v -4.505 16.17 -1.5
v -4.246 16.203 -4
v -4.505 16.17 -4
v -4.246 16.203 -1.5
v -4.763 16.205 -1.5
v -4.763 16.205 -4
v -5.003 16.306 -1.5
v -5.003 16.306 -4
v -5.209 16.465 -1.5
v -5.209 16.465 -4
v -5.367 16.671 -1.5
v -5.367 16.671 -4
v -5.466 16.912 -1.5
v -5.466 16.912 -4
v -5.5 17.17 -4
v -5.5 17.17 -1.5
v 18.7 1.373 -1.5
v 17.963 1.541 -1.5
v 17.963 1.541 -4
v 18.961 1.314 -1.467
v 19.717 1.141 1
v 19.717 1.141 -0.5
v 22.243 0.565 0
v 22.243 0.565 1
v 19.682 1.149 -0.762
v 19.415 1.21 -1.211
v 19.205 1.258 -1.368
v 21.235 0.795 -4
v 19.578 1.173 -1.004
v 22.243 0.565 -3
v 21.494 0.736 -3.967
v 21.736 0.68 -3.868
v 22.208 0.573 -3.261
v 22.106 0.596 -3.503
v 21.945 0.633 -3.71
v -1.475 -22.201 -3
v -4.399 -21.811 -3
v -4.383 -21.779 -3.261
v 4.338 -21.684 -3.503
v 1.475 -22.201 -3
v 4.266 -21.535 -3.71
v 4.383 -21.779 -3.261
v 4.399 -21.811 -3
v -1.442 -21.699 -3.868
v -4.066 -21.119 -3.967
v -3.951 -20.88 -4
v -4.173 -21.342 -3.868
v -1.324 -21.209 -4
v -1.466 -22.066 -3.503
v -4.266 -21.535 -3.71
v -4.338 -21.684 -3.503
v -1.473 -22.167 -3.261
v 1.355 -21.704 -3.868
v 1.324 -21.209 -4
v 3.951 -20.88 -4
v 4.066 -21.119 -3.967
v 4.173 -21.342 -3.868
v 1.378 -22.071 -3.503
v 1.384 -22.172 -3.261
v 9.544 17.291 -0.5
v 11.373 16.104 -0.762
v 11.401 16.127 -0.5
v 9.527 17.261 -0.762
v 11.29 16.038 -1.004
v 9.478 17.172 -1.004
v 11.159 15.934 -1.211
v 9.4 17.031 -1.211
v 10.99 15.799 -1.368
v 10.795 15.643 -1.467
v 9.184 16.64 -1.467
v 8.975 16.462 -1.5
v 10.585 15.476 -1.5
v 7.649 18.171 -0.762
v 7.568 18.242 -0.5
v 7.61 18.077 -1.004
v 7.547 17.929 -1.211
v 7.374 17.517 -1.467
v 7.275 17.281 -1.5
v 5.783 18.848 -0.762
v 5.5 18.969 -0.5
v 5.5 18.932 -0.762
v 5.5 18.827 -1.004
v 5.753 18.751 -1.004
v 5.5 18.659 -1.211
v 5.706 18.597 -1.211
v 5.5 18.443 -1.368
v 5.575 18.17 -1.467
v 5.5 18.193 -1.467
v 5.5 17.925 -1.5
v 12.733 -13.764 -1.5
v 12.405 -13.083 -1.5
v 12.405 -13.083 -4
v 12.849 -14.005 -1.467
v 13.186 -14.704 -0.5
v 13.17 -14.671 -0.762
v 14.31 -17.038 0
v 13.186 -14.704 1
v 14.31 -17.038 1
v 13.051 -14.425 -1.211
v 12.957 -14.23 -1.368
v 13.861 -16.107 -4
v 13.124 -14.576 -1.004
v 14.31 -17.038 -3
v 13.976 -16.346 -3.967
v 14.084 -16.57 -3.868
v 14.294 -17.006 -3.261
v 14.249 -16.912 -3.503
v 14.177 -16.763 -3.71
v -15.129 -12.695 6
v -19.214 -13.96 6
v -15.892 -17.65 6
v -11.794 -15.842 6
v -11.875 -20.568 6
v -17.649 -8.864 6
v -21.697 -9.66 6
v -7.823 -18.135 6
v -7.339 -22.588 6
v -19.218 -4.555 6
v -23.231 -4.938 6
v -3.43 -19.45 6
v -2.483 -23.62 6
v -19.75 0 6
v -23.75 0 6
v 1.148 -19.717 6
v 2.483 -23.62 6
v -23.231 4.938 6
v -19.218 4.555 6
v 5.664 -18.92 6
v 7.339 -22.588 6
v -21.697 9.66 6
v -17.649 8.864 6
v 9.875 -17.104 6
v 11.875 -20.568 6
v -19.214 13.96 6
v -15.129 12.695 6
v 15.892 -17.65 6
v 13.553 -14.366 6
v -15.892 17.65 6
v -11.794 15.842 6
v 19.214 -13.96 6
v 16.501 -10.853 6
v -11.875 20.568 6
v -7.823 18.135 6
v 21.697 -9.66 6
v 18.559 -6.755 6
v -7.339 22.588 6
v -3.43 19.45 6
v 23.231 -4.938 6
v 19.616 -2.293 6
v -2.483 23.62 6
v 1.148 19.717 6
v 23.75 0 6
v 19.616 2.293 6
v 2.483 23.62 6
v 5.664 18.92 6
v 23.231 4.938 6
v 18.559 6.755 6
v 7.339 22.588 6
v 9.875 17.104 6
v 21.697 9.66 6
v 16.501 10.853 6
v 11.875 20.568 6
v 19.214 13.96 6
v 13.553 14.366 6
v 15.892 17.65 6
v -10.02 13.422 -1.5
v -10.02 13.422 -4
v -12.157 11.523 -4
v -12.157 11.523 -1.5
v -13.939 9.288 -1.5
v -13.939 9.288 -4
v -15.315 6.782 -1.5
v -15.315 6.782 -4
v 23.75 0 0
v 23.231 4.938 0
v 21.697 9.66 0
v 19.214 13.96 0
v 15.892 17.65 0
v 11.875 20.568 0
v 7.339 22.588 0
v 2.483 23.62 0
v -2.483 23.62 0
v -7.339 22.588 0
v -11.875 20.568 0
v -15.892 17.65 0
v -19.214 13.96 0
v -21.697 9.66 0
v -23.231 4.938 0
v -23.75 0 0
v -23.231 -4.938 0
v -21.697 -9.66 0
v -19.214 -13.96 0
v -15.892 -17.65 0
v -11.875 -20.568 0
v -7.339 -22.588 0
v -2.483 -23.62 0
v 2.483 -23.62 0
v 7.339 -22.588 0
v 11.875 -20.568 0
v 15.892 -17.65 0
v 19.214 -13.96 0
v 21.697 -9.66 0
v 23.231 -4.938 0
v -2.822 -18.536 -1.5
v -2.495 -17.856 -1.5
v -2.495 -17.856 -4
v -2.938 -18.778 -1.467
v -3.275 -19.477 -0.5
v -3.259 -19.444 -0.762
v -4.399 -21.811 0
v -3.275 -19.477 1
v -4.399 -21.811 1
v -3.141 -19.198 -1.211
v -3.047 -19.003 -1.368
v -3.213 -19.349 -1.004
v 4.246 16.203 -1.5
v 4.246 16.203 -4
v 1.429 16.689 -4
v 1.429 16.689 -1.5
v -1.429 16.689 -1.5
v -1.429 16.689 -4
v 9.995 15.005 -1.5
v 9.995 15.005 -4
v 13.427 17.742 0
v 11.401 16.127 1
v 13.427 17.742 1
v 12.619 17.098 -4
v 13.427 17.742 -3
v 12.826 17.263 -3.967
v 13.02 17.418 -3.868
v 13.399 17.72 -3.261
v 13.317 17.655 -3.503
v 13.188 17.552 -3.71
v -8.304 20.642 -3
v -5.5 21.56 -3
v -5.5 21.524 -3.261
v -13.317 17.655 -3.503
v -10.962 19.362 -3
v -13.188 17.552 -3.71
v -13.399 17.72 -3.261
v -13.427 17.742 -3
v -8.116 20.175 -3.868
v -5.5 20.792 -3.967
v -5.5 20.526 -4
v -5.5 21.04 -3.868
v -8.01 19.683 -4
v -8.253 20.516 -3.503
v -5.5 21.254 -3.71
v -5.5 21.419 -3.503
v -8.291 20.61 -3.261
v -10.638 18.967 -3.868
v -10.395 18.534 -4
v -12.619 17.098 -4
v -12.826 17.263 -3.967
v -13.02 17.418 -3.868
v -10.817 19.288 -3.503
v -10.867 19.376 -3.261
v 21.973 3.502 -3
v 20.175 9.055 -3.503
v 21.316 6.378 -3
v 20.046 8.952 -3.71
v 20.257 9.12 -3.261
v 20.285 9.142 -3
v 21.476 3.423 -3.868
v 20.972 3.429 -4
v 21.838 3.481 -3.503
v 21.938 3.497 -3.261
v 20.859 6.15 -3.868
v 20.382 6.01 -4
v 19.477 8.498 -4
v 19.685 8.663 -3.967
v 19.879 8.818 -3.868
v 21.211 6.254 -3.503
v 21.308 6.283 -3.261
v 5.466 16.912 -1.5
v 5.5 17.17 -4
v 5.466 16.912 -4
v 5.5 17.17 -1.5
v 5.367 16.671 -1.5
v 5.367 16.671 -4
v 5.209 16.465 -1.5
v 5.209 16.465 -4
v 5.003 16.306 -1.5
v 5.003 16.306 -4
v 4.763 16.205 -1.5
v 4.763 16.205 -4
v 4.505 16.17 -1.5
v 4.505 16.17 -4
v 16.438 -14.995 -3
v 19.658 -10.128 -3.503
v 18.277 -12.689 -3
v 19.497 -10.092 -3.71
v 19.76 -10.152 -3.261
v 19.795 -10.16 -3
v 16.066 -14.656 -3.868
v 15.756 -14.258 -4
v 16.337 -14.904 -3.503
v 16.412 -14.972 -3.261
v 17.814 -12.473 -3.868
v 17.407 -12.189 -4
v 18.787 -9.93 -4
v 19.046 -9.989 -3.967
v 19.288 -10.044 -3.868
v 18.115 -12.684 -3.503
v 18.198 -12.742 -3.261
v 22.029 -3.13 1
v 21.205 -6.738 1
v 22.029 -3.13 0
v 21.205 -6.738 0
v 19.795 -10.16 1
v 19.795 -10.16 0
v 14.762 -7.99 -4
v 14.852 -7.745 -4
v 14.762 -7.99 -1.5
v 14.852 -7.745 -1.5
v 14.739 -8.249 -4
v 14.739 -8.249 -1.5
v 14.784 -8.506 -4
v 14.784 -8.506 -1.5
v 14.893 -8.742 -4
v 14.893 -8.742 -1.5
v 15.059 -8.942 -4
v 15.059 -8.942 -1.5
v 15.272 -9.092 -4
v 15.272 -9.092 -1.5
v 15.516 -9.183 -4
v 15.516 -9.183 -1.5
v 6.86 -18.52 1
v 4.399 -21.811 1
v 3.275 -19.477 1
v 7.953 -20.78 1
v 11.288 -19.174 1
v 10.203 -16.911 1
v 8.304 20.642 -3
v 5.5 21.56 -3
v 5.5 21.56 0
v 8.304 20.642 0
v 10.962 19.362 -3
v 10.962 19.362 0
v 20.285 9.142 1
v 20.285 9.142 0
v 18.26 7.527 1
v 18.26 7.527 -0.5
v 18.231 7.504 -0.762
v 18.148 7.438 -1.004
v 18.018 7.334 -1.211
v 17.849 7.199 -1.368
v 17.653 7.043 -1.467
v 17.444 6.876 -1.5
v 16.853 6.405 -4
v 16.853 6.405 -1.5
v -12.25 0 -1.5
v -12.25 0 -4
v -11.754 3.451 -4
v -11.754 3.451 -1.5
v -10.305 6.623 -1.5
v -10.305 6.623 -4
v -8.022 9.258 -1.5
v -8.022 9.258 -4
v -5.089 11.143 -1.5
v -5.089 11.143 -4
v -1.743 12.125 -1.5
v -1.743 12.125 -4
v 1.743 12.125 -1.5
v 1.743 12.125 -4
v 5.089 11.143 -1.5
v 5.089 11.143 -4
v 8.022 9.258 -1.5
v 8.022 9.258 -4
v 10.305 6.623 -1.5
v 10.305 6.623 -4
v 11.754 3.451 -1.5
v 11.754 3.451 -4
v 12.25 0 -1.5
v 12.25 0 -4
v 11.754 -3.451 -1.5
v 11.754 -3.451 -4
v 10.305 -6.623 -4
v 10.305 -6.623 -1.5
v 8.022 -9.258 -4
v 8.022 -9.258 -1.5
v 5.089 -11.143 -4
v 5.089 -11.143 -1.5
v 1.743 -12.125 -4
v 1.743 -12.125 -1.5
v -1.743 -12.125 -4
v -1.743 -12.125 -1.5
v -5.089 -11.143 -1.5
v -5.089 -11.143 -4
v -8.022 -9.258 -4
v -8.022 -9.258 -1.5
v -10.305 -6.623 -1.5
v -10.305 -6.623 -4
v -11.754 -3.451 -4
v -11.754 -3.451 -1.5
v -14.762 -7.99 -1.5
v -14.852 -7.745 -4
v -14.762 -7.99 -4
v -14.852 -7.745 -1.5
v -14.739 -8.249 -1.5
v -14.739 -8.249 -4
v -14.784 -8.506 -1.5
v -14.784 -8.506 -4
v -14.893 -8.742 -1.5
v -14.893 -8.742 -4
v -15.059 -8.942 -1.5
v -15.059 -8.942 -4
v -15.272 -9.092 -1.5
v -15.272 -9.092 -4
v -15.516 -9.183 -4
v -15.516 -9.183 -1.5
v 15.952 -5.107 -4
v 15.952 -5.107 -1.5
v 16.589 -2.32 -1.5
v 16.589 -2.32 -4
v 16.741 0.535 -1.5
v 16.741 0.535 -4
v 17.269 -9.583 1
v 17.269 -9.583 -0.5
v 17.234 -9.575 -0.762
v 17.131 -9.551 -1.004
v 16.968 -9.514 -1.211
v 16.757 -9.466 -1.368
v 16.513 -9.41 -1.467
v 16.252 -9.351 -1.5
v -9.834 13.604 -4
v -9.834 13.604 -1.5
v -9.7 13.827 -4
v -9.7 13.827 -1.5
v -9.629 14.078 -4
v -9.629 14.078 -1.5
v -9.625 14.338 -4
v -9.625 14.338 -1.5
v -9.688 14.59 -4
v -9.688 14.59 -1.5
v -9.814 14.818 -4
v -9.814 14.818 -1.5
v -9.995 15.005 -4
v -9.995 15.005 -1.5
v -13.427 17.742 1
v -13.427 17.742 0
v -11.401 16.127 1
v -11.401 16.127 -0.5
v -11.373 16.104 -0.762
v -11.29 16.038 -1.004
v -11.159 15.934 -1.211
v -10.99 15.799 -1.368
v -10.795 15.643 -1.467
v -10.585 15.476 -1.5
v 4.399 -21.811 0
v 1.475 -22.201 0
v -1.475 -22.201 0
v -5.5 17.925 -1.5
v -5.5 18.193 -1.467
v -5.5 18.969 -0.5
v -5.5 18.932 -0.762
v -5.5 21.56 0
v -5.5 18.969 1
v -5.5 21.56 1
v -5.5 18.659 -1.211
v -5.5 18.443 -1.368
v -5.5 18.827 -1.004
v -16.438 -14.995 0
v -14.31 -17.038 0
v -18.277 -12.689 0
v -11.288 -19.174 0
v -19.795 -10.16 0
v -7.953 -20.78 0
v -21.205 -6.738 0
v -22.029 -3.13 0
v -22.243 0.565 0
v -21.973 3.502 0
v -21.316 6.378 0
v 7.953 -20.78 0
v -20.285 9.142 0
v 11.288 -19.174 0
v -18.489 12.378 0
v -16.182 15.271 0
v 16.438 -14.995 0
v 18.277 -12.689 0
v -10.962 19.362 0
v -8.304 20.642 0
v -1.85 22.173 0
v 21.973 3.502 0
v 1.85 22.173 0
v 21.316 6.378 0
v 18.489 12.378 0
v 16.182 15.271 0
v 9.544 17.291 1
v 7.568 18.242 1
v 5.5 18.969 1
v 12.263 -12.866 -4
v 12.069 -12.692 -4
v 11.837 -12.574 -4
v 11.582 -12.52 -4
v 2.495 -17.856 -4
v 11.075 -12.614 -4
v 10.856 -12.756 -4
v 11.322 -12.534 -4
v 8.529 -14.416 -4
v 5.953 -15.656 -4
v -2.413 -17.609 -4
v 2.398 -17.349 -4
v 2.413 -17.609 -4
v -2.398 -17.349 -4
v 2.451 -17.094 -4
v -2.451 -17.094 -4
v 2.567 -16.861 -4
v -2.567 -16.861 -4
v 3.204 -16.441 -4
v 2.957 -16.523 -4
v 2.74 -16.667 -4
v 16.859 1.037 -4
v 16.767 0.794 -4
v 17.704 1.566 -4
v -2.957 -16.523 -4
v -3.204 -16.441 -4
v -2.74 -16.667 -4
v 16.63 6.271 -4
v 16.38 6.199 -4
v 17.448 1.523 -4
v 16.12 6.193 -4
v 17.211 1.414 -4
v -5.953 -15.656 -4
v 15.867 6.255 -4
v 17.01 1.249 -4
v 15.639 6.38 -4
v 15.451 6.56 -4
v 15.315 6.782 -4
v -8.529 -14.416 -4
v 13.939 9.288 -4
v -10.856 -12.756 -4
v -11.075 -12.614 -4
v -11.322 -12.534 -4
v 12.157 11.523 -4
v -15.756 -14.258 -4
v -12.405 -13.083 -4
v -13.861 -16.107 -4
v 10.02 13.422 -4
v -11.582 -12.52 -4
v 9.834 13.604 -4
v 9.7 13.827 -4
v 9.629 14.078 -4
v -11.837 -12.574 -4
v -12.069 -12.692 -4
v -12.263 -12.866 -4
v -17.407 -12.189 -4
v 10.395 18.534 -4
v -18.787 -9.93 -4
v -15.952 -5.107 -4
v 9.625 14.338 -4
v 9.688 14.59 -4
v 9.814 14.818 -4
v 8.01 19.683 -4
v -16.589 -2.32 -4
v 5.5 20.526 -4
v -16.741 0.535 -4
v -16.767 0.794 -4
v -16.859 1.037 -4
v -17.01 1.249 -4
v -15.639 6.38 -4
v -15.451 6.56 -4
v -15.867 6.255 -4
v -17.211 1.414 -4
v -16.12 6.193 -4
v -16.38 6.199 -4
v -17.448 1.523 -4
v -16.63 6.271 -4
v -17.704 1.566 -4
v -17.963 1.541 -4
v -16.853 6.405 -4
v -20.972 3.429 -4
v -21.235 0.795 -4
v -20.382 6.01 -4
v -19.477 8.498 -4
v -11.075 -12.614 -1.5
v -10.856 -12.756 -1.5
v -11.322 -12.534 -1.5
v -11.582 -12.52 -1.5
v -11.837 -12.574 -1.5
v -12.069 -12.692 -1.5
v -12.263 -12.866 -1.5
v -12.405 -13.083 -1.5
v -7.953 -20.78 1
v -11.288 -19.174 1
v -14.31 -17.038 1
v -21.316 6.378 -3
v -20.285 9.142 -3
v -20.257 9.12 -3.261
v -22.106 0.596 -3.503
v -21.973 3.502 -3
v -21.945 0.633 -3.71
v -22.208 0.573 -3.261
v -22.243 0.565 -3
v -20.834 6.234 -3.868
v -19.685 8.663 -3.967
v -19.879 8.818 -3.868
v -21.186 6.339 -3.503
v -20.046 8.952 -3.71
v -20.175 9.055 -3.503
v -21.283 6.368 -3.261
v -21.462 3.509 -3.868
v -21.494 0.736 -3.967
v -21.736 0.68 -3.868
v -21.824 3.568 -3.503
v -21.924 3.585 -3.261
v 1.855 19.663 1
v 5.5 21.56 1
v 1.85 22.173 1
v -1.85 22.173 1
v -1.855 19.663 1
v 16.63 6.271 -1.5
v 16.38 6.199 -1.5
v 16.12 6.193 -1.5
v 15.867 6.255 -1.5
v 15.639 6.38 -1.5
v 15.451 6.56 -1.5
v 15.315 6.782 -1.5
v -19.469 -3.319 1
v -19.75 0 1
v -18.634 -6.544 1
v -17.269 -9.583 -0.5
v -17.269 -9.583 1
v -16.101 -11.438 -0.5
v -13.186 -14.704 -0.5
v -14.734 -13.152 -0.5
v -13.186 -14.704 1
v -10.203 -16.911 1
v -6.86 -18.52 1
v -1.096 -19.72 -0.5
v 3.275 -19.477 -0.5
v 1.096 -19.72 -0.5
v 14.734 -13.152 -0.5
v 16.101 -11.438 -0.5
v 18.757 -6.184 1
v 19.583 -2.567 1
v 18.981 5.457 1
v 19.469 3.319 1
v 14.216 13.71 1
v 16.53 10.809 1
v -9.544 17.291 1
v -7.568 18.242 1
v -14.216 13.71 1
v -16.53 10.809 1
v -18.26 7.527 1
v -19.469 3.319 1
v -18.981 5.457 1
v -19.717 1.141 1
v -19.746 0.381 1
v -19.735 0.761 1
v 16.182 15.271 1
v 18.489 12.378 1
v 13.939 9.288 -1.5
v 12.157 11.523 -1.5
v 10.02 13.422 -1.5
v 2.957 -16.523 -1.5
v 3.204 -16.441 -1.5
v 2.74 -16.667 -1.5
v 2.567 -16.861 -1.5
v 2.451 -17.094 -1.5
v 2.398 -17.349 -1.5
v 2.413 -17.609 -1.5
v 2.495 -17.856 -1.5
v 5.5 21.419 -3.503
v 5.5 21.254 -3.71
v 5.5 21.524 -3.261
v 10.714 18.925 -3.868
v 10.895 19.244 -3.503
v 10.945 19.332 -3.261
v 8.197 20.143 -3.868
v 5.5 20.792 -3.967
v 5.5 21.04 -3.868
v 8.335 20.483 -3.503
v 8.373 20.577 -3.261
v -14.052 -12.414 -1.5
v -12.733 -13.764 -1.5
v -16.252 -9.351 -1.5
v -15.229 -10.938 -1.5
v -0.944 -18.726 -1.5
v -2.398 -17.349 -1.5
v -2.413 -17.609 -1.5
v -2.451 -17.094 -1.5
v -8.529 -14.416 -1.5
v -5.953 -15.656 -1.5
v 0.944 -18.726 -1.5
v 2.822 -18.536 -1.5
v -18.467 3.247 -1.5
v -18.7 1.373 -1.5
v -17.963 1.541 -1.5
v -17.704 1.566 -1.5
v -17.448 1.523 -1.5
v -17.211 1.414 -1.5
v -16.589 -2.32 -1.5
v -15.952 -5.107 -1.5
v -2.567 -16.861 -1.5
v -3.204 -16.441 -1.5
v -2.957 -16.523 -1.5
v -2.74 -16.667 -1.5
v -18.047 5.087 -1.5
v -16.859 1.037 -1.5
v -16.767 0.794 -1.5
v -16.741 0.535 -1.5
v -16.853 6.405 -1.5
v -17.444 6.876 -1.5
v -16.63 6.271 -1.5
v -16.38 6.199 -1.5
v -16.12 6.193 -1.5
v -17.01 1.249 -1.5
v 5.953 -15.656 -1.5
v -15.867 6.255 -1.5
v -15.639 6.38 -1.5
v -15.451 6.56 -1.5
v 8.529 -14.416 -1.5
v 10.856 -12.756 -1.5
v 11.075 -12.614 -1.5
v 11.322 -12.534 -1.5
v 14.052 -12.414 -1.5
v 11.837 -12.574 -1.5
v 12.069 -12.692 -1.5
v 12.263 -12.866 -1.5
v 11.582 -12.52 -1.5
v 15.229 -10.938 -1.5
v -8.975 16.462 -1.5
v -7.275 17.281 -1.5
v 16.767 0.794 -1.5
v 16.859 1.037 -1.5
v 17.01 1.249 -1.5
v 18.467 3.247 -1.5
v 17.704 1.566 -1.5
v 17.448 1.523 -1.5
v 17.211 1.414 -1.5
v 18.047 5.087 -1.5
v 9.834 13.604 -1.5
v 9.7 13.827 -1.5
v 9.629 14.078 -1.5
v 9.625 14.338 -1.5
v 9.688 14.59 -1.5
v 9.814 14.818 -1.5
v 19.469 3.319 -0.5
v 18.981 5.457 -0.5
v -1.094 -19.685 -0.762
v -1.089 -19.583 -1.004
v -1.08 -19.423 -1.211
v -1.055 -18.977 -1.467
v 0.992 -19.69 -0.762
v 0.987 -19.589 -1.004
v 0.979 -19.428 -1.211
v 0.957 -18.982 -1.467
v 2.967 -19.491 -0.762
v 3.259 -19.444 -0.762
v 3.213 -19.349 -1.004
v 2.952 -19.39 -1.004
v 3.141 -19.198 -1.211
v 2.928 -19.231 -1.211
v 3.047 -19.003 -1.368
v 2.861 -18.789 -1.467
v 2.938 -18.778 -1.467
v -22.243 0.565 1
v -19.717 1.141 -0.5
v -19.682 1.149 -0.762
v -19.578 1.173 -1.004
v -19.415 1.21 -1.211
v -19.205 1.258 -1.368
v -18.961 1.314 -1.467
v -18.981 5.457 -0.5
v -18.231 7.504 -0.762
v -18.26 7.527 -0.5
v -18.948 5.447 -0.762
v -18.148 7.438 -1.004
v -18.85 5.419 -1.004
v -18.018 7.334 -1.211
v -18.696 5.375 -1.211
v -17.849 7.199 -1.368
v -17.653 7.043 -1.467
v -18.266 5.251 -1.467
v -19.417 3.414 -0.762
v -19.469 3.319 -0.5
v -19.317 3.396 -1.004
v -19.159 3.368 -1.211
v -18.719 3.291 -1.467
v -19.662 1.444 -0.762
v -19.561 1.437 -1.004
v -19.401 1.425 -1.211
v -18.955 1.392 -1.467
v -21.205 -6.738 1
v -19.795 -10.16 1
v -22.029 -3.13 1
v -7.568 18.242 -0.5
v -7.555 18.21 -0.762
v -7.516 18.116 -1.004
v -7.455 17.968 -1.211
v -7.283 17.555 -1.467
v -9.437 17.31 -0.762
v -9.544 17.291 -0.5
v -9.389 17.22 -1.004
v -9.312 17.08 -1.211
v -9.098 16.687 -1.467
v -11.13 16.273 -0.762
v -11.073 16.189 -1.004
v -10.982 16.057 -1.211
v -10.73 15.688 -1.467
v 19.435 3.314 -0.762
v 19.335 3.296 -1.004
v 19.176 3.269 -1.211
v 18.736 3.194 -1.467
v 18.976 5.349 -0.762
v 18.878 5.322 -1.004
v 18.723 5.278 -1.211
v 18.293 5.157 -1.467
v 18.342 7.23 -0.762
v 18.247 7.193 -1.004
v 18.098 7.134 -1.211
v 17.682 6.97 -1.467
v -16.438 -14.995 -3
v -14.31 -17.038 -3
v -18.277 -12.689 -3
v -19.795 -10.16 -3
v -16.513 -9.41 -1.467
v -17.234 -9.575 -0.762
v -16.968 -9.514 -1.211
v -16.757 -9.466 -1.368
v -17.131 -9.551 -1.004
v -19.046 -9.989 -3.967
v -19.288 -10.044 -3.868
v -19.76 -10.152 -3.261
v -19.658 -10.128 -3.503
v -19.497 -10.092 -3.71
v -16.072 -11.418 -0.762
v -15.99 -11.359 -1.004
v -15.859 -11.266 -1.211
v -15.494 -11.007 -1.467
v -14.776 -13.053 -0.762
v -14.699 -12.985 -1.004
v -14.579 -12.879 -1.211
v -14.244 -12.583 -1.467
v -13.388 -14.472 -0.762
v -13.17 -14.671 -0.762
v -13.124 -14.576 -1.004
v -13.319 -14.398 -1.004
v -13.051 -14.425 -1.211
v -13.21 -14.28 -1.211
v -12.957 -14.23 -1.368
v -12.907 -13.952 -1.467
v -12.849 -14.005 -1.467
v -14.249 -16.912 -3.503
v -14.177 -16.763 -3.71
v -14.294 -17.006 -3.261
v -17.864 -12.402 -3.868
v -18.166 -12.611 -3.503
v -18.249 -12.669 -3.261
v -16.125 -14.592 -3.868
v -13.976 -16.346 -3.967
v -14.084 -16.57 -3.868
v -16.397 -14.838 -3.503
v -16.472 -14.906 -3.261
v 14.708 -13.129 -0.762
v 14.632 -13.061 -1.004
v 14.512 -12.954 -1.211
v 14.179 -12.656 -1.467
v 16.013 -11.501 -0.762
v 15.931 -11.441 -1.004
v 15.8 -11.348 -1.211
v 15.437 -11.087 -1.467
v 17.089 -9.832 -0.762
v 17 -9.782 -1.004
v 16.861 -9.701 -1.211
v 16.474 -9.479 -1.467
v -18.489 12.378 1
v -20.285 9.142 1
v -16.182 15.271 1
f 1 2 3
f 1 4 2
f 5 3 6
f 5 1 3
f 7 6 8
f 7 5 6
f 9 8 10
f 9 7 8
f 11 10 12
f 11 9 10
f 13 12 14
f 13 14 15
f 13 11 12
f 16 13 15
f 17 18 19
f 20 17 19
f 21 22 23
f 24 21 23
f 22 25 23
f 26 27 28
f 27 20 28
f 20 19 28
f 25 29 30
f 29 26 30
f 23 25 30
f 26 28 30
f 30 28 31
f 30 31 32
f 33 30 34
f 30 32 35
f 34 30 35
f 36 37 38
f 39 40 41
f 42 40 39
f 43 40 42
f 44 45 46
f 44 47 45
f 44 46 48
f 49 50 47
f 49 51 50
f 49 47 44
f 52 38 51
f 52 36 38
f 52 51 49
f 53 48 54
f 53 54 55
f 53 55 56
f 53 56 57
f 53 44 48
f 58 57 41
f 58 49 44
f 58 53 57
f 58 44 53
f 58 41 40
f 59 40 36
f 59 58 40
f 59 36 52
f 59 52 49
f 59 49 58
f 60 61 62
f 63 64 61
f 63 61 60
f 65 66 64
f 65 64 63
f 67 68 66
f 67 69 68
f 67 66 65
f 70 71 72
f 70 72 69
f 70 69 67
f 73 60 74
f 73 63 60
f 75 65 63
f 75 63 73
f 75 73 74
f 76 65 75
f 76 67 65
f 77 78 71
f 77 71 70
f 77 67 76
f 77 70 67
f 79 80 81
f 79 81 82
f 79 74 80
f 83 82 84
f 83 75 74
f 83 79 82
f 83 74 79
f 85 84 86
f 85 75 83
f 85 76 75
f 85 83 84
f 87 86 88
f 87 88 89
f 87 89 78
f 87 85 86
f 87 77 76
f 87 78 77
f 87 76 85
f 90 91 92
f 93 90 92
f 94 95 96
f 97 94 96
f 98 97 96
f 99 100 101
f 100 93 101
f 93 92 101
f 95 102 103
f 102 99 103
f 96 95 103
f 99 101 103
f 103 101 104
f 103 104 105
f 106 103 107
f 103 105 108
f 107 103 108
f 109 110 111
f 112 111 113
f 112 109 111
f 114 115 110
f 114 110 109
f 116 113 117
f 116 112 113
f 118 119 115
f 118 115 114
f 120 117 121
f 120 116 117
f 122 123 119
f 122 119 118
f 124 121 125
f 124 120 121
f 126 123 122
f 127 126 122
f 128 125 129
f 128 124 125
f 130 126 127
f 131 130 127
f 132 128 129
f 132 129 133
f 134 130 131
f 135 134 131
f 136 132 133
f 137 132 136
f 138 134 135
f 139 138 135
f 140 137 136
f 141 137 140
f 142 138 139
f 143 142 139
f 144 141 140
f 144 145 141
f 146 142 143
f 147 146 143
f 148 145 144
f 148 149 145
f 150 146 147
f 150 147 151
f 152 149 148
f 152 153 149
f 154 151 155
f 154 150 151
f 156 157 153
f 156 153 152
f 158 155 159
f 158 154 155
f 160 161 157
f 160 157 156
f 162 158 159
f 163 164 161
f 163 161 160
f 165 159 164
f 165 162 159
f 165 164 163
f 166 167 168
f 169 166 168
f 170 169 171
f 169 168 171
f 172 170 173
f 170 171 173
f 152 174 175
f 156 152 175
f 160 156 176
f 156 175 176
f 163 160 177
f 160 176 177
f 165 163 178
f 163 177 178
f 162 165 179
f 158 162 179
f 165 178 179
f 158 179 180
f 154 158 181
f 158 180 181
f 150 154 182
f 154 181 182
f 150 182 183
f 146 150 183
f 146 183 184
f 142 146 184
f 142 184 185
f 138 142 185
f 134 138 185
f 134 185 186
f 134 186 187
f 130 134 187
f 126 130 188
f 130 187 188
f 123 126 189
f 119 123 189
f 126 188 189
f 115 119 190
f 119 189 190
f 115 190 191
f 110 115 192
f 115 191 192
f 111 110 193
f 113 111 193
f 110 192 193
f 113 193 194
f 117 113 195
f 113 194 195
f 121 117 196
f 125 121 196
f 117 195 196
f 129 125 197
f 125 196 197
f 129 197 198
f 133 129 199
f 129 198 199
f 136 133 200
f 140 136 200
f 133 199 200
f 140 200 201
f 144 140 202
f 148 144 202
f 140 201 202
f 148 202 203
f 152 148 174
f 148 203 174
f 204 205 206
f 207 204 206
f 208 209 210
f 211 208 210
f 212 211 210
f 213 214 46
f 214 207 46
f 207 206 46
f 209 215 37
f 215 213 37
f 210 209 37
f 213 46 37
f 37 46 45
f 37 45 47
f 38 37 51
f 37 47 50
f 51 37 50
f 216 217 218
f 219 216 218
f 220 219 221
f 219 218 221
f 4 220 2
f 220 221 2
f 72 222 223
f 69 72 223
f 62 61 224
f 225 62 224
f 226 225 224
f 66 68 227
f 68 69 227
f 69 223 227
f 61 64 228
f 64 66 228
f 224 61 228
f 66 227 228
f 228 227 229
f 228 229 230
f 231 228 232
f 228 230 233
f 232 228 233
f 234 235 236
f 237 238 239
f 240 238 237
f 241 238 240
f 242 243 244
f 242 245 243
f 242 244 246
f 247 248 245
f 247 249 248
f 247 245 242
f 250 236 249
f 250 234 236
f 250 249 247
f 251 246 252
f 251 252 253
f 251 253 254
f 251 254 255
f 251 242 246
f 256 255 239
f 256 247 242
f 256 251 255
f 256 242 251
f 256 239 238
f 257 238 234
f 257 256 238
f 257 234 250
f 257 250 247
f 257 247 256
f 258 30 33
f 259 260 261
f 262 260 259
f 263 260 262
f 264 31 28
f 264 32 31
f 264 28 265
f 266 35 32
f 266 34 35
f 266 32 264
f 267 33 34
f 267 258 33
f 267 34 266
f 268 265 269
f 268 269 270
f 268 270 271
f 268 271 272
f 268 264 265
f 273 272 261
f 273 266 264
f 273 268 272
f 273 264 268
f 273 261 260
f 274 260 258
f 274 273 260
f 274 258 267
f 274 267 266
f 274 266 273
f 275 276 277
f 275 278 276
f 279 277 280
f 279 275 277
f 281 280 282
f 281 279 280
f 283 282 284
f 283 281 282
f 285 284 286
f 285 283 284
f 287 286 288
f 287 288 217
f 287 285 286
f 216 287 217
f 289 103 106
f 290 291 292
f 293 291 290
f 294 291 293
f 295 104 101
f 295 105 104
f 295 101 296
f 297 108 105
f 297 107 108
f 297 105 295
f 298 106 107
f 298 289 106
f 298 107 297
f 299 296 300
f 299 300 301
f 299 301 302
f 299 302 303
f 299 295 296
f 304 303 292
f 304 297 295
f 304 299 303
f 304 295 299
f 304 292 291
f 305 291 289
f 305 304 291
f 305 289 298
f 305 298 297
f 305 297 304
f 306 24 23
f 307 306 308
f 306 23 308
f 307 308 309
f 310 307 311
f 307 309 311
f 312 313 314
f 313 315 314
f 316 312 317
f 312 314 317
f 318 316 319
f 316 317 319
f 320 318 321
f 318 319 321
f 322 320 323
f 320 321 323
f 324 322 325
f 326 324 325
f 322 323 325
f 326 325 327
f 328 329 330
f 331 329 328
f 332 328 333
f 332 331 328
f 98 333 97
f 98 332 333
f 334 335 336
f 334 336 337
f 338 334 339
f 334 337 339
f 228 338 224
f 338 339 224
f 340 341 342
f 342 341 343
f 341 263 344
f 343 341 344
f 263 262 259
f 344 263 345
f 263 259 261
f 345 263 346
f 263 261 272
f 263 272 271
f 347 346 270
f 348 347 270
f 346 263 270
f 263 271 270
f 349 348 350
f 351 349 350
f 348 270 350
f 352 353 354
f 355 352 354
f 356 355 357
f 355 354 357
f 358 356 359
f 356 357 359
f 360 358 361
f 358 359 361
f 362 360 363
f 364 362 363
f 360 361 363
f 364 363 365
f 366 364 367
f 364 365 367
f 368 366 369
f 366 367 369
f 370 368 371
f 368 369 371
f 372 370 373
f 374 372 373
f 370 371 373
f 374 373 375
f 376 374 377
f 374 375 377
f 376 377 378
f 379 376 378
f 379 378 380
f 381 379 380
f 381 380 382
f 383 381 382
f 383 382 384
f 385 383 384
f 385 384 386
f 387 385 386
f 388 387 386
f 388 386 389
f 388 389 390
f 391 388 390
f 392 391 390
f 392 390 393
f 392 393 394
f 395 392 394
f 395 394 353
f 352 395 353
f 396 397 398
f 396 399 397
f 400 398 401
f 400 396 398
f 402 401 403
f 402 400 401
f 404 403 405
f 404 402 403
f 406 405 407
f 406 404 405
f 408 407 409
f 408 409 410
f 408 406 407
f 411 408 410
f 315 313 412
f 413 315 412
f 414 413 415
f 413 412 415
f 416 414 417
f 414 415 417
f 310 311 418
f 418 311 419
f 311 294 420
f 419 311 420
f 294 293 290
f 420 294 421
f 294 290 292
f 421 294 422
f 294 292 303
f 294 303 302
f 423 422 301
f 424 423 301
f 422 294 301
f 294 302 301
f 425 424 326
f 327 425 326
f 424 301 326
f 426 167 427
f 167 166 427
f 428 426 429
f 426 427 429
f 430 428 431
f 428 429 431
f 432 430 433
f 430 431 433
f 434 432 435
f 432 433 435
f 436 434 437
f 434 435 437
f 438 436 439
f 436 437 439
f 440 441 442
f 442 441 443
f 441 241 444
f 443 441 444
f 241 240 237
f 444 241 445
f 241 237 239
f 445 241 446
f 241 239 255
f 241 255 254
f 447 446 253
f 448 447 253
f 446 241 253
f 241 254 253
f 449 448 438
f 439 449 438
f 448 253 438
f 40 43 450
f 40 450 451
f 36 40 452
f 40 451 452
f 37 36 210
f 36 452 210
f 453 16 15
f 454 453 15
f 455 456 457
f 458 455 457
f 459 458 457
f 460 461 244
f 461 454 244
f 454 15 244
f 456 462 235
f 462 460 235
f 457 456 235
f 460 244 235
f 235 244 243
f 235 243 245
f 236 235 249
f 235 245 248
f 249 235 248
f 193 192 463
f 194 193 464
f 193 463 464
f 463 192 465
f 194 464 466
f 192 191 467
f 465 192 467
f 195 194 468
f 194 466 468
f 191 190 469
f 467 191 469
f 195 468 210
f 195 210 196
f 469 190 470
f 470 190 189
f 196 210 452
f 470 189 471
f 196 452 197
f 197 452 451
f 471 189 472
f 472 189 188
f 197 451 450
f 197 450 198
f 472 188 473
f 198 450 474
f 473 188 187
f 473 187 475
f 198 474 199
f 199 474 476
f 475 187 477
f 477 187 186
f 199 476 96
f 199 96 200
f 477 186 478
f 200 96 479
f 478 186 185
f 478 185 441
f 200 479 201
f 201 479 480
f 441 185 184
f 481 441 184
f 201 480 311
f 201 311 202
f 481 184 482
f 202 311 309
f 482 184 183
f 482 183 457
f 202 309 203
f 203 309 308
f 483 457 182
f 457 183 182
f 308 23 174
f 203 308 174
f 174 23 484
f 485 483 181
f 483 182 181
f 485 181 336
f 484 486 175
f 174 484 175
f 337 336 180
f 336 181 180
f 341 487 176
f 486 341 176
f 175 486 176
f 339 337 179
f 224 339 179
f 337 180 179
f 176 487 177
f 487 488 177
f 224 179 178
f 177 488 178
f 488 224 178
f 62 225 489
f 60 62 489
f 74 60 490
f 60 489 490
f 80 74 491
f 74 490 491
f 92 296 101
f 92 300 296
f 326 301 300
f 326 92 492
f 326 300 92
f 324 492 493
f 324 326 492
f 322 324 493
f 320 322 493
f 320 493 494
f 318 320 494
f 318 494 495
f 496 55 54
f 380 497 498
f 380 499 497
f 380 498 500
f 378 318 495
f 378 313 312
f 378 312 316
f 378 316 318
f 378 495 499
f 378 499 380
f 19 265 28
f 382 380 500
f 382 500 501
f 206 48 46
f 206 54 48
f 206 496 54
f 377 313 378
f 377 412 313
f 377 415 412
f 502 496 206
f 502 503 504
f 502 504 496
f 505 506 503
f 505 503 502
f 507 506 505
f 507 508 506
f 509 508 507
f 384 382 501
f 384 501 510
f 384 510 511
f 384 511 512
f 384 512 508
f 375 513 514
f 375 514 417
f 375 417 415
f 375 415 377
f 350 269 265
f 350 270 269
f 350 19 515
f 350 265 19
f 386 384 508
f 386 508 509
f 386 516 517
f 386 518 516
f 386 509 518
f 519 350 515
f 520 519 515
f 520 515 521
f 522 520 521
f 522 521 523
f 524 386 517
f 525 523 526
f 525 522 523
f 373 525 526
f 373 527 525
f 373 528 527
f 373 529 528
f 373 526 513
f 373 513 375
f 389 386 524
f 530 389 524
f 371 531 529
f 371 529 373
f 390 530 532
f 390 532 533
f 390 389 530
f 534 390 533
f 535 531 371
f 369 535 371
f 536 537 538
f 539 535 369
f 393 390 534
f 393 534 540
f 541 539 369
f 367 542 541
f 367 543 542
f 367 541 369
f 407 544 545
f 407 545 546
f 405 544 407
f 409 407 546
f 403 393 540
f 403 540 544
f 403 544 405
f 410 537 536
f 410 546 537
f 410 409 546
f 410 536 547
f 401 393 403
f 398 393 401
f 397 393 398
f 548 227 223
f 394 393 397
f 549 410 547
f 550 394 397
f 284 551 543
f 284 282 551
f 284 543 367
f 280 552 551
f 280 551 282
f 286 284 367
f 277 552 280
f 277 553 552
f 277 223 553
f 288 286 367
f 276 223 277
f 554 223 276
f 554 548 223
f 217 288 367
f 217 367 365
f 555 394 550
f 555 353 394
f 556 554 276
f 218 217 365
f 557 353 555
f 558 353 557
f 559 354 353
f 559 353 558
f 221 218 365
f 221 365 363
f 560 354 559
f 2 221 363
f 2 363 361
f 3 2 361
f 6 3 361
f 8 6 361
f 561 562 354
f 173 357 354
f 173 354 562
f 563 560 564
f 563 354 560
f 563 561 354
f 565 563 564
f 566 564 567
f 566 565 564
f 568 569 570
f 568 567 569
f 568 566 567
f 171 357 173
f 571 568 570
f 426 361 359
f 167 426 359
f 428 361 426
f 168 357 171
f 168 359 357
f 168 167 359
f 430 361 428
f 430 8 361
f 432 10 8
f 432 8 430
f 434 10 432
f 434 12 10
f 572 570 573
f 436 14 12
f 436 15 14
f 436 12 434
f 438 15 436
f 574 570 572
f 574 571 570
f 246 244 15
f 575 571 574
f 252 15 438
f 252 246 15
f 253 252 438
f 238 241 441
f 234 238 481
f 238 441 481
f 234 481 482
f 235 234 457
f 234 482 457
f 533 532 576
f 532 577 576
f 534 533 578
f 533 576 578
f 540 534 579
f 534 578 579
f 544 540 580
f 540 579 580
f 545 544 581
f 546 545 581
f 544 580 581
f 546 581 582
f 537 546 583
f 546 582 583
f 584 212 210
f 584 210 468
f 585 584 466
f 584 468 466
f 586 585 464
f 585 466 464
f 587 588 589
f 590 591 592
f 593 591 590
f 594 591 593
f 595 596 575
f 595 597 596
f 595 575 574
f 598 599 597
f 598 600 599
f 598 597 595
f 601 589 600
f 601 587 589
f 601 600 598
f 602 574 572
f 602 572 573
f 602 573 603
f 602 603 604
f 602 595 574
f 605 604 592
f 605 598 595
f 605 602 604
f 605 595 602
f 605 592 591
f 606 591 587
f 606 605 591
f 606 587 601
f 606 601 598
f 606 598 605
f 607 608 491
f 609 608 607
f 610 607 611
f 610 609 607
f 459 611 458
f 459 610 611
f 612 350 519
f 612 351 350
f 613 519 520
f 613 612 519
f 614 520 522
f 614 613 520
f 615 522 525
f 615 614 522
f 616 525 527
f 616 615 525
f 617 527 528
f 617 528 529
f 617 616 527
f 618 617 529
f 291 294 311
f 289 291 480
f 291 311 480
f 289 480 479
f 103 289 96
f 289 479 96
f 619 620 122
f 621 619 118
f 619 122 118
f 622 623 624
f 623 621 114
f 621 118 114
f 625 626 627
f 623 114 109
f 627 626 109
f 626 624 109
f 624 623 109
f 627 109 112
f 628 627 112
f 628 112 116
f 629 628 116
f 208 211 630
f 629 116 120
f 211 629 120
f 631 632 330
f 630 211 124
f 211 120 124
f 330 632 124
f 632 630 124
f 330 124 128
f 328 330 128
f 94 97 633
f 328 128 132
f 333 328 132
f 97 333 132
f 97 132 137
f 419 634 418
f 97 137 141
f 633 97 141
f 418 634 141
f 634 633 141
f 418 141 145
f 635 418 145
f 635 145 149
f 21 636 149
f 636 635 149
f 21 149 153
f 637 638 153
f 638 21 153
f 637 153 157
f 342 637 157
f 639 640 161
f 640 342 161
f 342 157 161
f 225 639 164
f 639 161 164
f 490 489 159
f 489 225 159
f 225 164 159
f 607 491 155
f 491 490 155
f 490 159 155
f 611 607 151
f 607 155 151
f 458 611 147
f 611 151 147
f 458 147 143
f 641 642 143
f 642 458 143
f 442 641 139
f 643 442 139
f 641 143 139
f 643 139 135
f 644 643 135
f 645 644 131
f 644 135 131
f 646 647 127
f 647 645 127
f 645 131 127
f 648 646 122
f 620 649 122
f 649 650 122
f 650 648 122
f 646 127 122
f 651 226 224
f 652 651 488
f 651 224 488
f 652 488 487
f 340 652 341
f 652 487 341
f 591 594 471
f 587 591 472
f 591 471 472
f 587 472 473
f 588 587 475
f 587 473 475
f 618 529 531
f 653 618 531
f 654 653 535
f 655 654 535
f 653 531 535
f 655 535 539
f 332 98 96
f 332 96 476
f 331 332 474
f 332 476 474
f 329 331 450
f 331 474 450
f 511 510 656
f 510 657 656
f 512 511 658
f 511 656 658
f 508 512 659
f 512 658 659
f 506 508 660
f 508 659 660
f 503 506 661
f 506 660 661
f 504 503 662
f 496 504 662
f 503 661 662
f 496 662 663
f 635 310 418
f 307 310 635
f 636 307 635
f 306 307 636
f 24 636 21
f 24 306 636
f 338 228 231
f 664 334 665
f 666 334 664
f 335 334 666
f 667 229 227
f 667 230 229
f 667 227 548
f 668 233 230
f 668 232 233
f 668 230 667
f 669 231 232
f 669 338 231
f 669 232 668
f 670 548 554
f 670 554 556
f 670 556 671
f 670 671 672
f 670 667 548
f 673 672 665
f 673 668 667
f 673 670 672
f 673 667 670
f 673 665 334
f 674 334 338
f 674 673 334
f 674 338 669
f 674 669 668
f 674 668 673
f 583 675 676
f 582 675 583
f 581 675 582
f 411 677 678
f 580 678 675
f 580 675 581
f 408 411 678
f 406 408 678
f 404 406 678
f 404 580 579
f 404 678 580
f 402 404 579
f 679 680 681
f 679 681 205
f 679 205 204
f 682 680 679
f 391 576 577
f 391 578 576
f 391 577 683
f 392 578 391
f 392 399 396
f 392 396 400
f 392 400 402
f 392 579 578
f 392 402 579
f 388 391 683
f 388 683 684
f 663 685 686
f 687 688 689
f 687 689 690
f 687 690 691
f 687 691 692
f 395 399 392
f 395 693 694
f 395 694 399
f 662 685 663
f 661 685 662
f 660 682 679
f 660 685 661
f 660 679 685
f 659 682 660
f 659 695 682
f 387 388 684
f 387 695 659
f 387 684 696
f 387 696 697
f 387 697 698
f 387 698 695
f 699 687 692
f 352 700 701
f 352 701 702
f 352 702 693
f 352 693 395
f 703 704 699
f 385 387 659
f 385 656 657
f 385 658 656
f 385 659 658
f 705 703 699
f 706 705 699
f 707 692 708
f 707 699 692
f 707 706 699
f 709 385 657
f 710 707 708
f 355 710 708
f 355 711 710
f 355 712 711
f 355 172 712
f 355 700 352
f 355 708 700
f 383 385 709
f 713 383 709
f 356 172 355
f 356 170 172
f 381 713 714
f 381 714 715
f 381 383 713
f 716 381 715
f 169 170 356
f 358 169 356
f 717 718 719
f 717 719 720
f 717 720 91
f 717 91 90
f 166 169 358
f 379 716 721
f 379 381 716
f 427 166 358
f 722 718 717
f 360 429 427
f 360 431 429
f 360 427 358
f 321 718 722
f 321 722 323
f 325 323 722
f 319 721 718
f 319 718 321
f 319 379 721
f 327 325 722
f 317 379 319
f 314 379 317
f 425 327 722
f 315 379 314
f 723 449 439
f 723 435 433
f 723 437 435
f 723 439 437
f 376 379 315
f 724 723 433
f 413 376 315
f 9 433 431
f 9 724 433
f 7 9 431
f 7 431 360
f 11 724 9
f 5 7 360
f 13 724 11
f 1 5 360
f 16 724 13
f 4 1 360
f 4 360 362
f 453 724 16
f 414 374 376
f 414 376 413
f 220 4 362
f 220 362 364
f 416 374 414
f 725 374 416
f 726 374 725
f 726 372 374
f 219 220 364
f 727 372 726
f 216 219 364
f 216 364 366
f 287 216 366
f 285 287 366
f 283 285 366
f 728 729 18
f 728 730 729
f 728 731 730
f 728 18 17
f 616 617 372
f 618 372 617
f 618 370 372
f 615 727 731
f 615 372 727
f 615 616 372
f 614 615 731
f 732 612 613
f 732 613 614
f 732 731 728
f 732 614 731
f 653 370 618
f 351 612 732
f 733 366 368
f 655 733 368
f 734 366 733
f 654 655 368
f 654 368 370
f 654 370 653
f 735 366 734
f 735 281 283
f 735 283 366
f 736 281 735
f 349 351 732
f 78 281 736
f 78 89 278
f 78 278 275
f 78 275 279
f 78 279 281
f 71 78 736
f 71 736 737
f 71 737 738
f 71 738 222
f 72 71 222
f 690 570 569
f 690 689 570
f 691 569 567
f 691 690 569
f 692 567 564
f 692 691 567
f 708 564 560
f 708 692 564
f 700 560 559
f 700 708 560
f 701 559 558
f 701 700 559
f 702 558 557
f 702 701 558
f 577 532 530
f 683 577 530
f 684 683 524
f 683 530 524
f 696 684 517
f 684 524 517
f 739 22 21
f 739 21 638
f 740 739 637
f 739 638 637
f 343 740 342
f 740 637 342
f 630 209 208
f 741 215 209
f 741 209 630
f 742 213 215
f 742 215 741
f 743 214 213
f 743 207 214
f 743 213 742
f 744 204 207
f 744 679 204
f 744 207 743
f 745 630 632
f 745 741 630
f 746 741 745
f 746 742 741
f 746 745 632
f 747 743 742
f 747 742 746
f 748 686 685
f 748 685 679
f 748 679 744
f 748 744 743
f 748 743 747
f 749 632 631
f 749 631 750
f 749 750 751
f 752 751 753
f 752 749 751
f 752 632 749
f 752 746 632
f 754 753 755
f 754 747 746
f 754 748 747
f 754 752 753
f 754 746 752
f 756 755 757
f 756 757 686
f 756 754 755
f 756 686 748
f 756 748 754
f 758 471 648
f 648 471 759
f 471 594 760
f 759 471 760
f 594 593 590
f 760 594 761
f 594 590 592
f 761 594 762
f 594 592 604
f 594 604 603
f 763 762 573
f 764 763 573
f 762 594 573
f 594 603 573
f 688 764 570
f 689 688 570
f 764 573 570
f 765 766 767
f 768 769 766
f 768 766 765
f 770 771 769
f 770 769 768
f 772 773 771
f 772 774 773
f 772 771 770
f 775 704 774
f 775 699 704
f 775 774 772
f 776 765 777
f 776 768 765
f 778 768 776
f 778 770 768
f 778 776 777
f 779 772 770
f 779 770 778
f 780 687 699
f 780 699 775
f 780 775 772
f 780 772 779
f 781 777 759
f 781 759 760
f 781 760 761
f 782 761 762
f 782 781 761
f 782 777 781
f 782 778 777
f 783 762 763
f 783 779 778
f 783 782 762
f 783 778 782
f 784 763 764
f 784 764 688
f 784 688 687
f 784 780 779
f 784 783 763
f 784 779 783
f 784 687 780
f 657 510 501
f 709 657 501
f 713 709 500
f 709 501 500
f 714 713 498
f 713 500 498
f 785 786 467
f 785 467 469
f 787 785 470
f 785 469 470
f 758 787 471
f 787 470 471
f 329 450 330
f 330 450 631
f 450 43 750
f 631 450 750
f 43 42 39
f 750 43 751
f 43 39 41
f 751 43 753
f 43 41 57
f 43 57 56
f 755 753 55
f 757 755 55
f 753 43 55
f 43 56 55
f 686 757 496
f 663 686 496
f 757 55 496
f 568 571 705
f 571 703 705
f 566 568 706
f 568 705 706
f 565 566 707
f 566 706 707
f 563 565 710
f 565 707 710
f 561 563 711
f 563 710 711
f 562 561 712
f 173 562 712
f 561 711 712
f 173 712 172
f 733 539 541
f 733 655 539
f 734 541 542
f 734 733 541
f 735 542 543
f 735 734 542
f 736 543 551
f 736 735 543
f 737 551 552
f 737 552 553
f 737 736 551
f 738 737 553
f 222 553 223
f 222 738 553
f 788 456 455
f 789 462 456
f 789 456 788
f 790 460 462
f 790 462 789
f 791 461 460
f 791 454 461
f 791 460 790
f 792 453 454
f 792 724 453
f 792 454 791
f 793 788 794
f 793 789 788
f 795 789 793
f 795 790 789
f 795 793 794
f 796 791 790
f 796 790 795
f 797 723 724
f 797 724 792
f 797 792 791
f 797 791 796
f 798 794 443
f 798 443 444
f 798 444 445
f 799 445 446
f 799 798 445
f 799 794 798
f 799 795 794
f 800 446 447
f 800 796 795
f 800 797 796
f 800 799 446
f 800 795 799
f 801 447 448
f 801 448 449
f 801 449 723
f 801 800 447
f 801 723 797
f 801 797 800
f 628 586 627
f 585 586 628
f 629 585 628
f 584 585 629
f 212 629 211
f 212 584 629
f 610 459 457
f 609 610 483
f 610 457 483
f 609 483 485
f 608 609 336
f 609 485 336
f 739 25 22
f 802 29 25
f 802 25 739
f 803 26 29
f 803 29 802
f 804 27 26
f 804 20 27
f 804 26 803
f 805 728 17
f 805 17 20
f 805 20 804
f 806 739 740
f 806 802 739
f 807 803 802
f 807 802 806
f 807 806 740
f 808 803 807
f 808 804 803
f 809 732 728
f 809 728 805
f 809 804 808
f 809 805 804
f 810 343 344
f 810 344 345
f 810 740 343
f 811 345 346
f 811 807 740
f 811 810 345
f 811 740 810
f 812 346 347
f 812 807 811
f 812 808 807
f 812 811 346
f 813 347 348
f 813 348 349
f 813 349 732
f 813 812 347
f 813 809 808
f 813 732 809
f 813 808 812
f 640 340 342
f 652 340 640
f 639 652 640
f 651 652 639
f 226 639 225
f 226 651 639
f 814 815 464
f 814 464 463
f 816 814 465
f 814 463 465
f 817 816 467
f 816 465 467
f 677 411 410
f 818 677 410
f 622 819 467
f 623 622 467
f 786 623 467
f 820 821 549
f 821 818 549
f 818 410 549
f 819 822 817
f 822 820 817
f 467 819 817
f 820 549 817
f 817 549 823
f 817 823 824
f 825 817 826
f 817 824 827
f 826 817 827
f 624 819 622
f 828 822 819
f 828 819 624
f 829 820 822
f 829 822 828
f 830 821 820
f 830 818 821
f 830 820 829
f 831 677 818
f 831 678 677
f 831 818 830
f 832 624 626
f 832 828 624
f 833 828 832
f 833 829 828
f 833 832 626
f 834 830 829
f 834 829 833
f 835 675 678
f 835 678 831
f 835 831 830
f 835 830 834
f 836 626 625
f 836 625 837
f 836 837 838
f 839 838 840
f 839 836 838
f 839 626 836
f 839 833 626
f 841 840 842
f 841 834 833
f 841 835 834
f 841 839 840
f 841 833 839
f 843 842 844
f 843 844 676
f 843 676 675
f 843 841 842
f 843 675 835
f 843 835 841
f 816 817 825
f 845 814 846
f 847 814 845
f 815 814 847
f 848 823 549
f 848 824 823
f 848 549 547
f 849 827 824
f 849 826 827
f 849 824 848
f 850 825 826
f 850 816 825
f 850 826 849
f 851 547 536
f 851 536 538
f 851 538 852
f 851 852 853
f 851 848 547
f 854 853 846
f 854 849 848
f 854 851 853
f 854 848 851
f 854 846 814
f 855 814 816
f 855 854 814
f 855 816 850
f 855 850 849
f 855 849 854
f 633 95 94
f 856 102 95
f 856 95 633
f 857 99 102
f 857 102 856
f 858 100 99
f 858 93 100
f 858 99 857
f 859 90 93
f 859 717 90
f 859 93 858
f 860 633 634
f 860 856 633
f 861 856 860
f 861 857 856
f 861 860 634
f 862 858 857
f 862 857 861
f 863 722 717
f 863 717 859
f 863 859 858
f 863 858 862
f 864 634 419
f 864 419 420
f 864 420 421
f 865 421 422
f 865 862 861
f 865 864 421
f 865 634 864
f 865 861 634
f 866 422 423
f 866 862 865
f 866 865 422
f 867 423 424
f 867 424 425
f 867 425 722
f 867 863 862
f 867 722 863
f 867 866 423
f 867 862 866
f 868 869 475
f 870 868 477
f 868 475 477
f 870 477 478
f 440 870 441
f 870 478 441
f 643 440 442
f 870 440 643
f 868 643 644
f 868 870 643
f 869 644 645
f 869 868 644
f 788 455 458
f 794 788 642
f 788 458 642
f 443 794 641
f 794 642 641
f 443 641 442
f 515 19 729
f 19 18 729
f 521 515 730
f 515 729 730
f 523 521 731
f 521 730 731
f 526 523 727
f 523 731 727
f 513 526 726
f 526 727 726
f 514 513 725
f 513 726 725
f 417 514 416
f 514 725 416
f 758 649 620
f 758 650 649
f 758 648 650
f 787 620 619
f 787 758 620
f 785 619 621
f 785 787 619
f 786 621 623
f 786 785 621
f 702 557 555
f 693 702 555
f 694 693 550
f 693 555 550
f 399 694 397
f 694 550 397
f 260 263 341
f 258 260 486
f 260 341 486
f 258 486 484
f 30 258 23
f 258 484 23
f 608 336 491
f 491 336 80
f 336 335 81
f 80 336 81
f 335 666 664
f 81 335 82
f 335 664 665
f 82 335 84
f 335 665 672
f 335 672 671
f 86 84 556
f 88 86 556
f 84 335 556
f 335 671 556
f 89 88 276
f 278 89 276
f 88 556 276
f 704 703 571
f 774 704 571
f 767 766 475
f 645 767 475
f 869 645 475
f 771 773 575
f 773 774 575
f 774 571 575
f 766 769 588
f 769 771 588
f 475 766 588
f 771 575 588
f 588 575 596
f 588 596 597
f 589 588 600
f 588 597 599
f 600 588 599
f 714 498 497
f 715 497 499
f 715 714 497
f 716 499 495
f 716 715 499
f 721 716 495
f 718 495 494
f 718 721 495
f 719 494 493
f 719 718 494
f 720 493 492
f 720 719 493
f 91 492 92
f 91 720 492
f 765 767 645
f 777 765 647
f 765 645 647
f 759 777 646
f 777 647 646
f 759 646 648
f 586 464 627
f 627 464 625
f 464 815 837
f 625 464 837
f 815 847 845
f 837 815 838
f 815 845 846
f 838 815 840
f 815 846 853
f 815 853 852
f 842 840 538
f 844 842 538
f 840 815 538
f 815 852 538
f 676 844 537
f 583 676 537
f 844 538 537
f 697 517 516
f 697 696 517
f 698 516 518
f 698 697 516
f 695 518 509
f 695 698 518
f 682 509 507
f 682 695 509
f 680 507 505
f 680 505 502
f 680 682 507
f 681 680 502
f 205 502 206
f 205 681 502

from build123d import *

# Parameters (mm, degrees)
CROQUIS1_R                 = 23.75
SALIENTE_EXTRUIR1_DEPTH    = 6
CROQUIS4_R                 = 22.25
CORTAR_EXTRUIR1_DEPTH      = 1
CROQUIS5_R                 = 19.75
CORTAR_EXTRUIR2_DEPTH      = 2
CORTAR_EXTRUIR2_DEPTH_BACK = 6
CROQUIS6_R                 = 22.25
SALIENTE_EXTRUIR2_DEPTH    = 5
CROQUIS7_R                 = 19.75
CORTAR_EXTRUIR3_DEPTH      = 2.5
REDONDEO1_R                = 1
CORTAR_EXTRUIR4_DEPTH      = 2.5
CORTAR_EXTRUIR5_DEPTH      = 2.5
MATRIZC1_COUNT             = 7
REDONDEO2_R                = 1
REDONDEO3_R                = 1
CROQUIS10_R                = 12.25
CORTAR_EXTRUIR6_DEPTH      = 1.0000001
CORTAR_EXTRUIR6_DEPTH_BACK = 11


with BuildPart() as part:
    # Croquis1 → Saliente-Extruir1 (new body)
    with BuildSketch(Plane.XY):
        Circle(CROQUIS1_R)
    extrude(amount=SALIENTE_EXTRUIR1_DEPTH)

    # Croquis4 → Cortar-Extruir1 (cut)
    with BuildSketch(Plane(origin=(0, 0, 0), x_dir=(-1, 0, 0), z_dir=(0, 0, -1))):
        Circle(CROQUIS4_R)
    extrude(amount=-CORTAR_EXTRUIR1_DEPTH, mode=Mode.SUBTRACT)

    # Croquis5 → Cortar-Extruir2 (cut, two sides)
    with BuildSketch(Plane(origin=(0, 0, 1), x_dir=(-1, 0, 0), z_dir=(0, 0, -1))) as cortar_extruir2_sk:
        Circle(CROQUIS5_R)
    extrude(amount=CORTAR_EXTRUIR2_DEPTH, mode=Mode.SUBTRACT)
    extrude(cortar_extruir2_sk.sketch, amount=-CORTAR_EXTRUIR2_DEPTH_BACK, mode=Mode.SUBTRACT)

    # Croquis6 → Saliente-Extruir2 (add)
    with BuildSketch(Plane(origin=(0, 0, 1), x_dir=(-1, 0, 0), z_dir=(0, 0, -1))):
        Circle(CROQUIS6_R)
    extrude(amount=SALIENTE_EXTRUIR2_DEPTH)

    # Croquis7 → Cortar-Extruir3 (cut)
    with BuildSketch(Plane.XY.offset(1)):
        Circle(CROQUIS7_R)
    extrude(amount=-CORTAR_EXTRUIR3_DEPTH, mode=Mode.SUBTRACT)

    # Redondeo1
    redondeo1_edges = [part.edges().sort_by_distance(p)[0] for p in [
        (-19.75, 0, -1.5),
    ]]
    fillet(redondeo1_edges, radius=REDONDEO1_R)

    # Croquis8 → Cortar-Extruir4 (cut)
    with BuildSketch(Plane(origin=(0, 0, -4), x_dir=(-1, 0, 0), z_dir=(0, 0, -1))):
        with BuildLine():
            Line((-5.5, 21.559510662), (-5.5, 15.821267332))
            ThreePointArc((-5.5, 15.821267332), (0, 16.75), (5.5, 15.821267332))
            Line((5.5, 15.821267332), (5.5, 21.559510662))
            ThreePointArc((5.5, 21.559510662), (0, 22.25), (-5.5, 21.559510662))
        make_face()
    cortar_extruir4 = extrude(amount=-CORTAR_EXTRUIR4_DEPTH, mode=Mode.SUBTRACT)

    # Croquis9 → Cortar-Extruir5 (cut)
    with BuildSketch(Plane(origin=(0, 0, -1.5), x_dir=(-1, 0, 0), z_dir=(0, 0, -1))):
        with BuildLine():
            Line((5.5, 17.92519177), (5.5, 21.559510662))
            ThreePointArc((5.5, 21.559510662), (0, 22.25), (-5.5, 21.559510662))
            Line((-5.5, 21.559510662), (-5.5, 17.92519177))
            ThreePointArc((-5.5, 17.92519177), (0, 18.75), (5.5, 17.92519177))
        make_face()
    cortar_extruir5 = extrude(amount=-CORTAR_EXTRUIR5_DEPTH, mode=Mode.SUBTRACT)

    # MatrizC1: Cortar-Extruir4, Cortar-Extruir5 ×7 about axis
    matrizc1_axis = Axis((0, 0, 0), (0, 0, 1))
    for i in range(1, MATRIZC1_COUNT):
        add(cortar_extruir4.rotate(matrizc1_axis, i * 360 / MATRIZC1_COUNT), mode=Mode.SUBTRACT)
        add(cortar_extruir5.rotate(matrizc1_axis, i * 360 / MATRIZC1_COUNT), mode=Mode.SUBTRACT)

    # Redondeo2
    redondeo2_edges = [part.edges().sort_by_distance(p)[0] for p in [
        (-14.200729992, -8.8826667, -2.75),
        (-16.648460265, 1.841540334, -2.75),
        (-1.909261854, -16.640829882, -2.75),
        (-11.819919401, -11.868108752, -2.75),
        (11.819919401, -11.868108752, -2.75),
        (1.909261854, -16.640829882, -2.75),
        (16.648460265, 1.841540334, -2.75),
        (14.200729992, -8.8826667, -2.75),
        (8.940370983, 14.164471988, -2.75),
        (15.798758803, 5.564325681, -2.75),
        (-5.5, 15.821267332, -2.75),
        (5.5, 15.821267332, -2.75),
        (-15.798758803, 5.564325681, -2.75),
        (-8.940370983, 14.164471988, -2.75),
    ]]
    fillet(redondeo2_edges, radius=REDONDEO2_R)

    # Redondeo3
    redondeo3_edges = [part.edges().sort_by_distance(p)[0] for p in [
        (9.653913195, 20.046557311, -4),
        (21.692146046, 4.951090781, -4),
        (17.395750485, -13.872648091, -4),
        (0, -22.25, -4),
        (-17.395750485, -13.872648091, -4),
        (-21.692146046, 4.951090781, -4),
        (-9.653913195, 20.046557311, -4),
    ]]
    fillet(redondeo3_edges, radius=REDONDEO3_R)

    # Croquis10 → Cortar-Extruir6 (cut, two sides)
    with BuildSketch(Plane(origin=(0, 0, -4), x_dir=(-1, 0, 0), z_dir=(0, 0, -1))) as cortar_extruir6_sk:
        Circle(CROQUIS10_R)
    extrude(amount=CORTAR_EXTRUIR6_DEPTH, mode=Mode.SUBTRACT)
    extrude(cortar_extruir6_sk.sketch, amount=-CORTAR_EXTRUIR6_DEPTH_BACK, mode=Mode.SUBTRACT)


solid = part.part
